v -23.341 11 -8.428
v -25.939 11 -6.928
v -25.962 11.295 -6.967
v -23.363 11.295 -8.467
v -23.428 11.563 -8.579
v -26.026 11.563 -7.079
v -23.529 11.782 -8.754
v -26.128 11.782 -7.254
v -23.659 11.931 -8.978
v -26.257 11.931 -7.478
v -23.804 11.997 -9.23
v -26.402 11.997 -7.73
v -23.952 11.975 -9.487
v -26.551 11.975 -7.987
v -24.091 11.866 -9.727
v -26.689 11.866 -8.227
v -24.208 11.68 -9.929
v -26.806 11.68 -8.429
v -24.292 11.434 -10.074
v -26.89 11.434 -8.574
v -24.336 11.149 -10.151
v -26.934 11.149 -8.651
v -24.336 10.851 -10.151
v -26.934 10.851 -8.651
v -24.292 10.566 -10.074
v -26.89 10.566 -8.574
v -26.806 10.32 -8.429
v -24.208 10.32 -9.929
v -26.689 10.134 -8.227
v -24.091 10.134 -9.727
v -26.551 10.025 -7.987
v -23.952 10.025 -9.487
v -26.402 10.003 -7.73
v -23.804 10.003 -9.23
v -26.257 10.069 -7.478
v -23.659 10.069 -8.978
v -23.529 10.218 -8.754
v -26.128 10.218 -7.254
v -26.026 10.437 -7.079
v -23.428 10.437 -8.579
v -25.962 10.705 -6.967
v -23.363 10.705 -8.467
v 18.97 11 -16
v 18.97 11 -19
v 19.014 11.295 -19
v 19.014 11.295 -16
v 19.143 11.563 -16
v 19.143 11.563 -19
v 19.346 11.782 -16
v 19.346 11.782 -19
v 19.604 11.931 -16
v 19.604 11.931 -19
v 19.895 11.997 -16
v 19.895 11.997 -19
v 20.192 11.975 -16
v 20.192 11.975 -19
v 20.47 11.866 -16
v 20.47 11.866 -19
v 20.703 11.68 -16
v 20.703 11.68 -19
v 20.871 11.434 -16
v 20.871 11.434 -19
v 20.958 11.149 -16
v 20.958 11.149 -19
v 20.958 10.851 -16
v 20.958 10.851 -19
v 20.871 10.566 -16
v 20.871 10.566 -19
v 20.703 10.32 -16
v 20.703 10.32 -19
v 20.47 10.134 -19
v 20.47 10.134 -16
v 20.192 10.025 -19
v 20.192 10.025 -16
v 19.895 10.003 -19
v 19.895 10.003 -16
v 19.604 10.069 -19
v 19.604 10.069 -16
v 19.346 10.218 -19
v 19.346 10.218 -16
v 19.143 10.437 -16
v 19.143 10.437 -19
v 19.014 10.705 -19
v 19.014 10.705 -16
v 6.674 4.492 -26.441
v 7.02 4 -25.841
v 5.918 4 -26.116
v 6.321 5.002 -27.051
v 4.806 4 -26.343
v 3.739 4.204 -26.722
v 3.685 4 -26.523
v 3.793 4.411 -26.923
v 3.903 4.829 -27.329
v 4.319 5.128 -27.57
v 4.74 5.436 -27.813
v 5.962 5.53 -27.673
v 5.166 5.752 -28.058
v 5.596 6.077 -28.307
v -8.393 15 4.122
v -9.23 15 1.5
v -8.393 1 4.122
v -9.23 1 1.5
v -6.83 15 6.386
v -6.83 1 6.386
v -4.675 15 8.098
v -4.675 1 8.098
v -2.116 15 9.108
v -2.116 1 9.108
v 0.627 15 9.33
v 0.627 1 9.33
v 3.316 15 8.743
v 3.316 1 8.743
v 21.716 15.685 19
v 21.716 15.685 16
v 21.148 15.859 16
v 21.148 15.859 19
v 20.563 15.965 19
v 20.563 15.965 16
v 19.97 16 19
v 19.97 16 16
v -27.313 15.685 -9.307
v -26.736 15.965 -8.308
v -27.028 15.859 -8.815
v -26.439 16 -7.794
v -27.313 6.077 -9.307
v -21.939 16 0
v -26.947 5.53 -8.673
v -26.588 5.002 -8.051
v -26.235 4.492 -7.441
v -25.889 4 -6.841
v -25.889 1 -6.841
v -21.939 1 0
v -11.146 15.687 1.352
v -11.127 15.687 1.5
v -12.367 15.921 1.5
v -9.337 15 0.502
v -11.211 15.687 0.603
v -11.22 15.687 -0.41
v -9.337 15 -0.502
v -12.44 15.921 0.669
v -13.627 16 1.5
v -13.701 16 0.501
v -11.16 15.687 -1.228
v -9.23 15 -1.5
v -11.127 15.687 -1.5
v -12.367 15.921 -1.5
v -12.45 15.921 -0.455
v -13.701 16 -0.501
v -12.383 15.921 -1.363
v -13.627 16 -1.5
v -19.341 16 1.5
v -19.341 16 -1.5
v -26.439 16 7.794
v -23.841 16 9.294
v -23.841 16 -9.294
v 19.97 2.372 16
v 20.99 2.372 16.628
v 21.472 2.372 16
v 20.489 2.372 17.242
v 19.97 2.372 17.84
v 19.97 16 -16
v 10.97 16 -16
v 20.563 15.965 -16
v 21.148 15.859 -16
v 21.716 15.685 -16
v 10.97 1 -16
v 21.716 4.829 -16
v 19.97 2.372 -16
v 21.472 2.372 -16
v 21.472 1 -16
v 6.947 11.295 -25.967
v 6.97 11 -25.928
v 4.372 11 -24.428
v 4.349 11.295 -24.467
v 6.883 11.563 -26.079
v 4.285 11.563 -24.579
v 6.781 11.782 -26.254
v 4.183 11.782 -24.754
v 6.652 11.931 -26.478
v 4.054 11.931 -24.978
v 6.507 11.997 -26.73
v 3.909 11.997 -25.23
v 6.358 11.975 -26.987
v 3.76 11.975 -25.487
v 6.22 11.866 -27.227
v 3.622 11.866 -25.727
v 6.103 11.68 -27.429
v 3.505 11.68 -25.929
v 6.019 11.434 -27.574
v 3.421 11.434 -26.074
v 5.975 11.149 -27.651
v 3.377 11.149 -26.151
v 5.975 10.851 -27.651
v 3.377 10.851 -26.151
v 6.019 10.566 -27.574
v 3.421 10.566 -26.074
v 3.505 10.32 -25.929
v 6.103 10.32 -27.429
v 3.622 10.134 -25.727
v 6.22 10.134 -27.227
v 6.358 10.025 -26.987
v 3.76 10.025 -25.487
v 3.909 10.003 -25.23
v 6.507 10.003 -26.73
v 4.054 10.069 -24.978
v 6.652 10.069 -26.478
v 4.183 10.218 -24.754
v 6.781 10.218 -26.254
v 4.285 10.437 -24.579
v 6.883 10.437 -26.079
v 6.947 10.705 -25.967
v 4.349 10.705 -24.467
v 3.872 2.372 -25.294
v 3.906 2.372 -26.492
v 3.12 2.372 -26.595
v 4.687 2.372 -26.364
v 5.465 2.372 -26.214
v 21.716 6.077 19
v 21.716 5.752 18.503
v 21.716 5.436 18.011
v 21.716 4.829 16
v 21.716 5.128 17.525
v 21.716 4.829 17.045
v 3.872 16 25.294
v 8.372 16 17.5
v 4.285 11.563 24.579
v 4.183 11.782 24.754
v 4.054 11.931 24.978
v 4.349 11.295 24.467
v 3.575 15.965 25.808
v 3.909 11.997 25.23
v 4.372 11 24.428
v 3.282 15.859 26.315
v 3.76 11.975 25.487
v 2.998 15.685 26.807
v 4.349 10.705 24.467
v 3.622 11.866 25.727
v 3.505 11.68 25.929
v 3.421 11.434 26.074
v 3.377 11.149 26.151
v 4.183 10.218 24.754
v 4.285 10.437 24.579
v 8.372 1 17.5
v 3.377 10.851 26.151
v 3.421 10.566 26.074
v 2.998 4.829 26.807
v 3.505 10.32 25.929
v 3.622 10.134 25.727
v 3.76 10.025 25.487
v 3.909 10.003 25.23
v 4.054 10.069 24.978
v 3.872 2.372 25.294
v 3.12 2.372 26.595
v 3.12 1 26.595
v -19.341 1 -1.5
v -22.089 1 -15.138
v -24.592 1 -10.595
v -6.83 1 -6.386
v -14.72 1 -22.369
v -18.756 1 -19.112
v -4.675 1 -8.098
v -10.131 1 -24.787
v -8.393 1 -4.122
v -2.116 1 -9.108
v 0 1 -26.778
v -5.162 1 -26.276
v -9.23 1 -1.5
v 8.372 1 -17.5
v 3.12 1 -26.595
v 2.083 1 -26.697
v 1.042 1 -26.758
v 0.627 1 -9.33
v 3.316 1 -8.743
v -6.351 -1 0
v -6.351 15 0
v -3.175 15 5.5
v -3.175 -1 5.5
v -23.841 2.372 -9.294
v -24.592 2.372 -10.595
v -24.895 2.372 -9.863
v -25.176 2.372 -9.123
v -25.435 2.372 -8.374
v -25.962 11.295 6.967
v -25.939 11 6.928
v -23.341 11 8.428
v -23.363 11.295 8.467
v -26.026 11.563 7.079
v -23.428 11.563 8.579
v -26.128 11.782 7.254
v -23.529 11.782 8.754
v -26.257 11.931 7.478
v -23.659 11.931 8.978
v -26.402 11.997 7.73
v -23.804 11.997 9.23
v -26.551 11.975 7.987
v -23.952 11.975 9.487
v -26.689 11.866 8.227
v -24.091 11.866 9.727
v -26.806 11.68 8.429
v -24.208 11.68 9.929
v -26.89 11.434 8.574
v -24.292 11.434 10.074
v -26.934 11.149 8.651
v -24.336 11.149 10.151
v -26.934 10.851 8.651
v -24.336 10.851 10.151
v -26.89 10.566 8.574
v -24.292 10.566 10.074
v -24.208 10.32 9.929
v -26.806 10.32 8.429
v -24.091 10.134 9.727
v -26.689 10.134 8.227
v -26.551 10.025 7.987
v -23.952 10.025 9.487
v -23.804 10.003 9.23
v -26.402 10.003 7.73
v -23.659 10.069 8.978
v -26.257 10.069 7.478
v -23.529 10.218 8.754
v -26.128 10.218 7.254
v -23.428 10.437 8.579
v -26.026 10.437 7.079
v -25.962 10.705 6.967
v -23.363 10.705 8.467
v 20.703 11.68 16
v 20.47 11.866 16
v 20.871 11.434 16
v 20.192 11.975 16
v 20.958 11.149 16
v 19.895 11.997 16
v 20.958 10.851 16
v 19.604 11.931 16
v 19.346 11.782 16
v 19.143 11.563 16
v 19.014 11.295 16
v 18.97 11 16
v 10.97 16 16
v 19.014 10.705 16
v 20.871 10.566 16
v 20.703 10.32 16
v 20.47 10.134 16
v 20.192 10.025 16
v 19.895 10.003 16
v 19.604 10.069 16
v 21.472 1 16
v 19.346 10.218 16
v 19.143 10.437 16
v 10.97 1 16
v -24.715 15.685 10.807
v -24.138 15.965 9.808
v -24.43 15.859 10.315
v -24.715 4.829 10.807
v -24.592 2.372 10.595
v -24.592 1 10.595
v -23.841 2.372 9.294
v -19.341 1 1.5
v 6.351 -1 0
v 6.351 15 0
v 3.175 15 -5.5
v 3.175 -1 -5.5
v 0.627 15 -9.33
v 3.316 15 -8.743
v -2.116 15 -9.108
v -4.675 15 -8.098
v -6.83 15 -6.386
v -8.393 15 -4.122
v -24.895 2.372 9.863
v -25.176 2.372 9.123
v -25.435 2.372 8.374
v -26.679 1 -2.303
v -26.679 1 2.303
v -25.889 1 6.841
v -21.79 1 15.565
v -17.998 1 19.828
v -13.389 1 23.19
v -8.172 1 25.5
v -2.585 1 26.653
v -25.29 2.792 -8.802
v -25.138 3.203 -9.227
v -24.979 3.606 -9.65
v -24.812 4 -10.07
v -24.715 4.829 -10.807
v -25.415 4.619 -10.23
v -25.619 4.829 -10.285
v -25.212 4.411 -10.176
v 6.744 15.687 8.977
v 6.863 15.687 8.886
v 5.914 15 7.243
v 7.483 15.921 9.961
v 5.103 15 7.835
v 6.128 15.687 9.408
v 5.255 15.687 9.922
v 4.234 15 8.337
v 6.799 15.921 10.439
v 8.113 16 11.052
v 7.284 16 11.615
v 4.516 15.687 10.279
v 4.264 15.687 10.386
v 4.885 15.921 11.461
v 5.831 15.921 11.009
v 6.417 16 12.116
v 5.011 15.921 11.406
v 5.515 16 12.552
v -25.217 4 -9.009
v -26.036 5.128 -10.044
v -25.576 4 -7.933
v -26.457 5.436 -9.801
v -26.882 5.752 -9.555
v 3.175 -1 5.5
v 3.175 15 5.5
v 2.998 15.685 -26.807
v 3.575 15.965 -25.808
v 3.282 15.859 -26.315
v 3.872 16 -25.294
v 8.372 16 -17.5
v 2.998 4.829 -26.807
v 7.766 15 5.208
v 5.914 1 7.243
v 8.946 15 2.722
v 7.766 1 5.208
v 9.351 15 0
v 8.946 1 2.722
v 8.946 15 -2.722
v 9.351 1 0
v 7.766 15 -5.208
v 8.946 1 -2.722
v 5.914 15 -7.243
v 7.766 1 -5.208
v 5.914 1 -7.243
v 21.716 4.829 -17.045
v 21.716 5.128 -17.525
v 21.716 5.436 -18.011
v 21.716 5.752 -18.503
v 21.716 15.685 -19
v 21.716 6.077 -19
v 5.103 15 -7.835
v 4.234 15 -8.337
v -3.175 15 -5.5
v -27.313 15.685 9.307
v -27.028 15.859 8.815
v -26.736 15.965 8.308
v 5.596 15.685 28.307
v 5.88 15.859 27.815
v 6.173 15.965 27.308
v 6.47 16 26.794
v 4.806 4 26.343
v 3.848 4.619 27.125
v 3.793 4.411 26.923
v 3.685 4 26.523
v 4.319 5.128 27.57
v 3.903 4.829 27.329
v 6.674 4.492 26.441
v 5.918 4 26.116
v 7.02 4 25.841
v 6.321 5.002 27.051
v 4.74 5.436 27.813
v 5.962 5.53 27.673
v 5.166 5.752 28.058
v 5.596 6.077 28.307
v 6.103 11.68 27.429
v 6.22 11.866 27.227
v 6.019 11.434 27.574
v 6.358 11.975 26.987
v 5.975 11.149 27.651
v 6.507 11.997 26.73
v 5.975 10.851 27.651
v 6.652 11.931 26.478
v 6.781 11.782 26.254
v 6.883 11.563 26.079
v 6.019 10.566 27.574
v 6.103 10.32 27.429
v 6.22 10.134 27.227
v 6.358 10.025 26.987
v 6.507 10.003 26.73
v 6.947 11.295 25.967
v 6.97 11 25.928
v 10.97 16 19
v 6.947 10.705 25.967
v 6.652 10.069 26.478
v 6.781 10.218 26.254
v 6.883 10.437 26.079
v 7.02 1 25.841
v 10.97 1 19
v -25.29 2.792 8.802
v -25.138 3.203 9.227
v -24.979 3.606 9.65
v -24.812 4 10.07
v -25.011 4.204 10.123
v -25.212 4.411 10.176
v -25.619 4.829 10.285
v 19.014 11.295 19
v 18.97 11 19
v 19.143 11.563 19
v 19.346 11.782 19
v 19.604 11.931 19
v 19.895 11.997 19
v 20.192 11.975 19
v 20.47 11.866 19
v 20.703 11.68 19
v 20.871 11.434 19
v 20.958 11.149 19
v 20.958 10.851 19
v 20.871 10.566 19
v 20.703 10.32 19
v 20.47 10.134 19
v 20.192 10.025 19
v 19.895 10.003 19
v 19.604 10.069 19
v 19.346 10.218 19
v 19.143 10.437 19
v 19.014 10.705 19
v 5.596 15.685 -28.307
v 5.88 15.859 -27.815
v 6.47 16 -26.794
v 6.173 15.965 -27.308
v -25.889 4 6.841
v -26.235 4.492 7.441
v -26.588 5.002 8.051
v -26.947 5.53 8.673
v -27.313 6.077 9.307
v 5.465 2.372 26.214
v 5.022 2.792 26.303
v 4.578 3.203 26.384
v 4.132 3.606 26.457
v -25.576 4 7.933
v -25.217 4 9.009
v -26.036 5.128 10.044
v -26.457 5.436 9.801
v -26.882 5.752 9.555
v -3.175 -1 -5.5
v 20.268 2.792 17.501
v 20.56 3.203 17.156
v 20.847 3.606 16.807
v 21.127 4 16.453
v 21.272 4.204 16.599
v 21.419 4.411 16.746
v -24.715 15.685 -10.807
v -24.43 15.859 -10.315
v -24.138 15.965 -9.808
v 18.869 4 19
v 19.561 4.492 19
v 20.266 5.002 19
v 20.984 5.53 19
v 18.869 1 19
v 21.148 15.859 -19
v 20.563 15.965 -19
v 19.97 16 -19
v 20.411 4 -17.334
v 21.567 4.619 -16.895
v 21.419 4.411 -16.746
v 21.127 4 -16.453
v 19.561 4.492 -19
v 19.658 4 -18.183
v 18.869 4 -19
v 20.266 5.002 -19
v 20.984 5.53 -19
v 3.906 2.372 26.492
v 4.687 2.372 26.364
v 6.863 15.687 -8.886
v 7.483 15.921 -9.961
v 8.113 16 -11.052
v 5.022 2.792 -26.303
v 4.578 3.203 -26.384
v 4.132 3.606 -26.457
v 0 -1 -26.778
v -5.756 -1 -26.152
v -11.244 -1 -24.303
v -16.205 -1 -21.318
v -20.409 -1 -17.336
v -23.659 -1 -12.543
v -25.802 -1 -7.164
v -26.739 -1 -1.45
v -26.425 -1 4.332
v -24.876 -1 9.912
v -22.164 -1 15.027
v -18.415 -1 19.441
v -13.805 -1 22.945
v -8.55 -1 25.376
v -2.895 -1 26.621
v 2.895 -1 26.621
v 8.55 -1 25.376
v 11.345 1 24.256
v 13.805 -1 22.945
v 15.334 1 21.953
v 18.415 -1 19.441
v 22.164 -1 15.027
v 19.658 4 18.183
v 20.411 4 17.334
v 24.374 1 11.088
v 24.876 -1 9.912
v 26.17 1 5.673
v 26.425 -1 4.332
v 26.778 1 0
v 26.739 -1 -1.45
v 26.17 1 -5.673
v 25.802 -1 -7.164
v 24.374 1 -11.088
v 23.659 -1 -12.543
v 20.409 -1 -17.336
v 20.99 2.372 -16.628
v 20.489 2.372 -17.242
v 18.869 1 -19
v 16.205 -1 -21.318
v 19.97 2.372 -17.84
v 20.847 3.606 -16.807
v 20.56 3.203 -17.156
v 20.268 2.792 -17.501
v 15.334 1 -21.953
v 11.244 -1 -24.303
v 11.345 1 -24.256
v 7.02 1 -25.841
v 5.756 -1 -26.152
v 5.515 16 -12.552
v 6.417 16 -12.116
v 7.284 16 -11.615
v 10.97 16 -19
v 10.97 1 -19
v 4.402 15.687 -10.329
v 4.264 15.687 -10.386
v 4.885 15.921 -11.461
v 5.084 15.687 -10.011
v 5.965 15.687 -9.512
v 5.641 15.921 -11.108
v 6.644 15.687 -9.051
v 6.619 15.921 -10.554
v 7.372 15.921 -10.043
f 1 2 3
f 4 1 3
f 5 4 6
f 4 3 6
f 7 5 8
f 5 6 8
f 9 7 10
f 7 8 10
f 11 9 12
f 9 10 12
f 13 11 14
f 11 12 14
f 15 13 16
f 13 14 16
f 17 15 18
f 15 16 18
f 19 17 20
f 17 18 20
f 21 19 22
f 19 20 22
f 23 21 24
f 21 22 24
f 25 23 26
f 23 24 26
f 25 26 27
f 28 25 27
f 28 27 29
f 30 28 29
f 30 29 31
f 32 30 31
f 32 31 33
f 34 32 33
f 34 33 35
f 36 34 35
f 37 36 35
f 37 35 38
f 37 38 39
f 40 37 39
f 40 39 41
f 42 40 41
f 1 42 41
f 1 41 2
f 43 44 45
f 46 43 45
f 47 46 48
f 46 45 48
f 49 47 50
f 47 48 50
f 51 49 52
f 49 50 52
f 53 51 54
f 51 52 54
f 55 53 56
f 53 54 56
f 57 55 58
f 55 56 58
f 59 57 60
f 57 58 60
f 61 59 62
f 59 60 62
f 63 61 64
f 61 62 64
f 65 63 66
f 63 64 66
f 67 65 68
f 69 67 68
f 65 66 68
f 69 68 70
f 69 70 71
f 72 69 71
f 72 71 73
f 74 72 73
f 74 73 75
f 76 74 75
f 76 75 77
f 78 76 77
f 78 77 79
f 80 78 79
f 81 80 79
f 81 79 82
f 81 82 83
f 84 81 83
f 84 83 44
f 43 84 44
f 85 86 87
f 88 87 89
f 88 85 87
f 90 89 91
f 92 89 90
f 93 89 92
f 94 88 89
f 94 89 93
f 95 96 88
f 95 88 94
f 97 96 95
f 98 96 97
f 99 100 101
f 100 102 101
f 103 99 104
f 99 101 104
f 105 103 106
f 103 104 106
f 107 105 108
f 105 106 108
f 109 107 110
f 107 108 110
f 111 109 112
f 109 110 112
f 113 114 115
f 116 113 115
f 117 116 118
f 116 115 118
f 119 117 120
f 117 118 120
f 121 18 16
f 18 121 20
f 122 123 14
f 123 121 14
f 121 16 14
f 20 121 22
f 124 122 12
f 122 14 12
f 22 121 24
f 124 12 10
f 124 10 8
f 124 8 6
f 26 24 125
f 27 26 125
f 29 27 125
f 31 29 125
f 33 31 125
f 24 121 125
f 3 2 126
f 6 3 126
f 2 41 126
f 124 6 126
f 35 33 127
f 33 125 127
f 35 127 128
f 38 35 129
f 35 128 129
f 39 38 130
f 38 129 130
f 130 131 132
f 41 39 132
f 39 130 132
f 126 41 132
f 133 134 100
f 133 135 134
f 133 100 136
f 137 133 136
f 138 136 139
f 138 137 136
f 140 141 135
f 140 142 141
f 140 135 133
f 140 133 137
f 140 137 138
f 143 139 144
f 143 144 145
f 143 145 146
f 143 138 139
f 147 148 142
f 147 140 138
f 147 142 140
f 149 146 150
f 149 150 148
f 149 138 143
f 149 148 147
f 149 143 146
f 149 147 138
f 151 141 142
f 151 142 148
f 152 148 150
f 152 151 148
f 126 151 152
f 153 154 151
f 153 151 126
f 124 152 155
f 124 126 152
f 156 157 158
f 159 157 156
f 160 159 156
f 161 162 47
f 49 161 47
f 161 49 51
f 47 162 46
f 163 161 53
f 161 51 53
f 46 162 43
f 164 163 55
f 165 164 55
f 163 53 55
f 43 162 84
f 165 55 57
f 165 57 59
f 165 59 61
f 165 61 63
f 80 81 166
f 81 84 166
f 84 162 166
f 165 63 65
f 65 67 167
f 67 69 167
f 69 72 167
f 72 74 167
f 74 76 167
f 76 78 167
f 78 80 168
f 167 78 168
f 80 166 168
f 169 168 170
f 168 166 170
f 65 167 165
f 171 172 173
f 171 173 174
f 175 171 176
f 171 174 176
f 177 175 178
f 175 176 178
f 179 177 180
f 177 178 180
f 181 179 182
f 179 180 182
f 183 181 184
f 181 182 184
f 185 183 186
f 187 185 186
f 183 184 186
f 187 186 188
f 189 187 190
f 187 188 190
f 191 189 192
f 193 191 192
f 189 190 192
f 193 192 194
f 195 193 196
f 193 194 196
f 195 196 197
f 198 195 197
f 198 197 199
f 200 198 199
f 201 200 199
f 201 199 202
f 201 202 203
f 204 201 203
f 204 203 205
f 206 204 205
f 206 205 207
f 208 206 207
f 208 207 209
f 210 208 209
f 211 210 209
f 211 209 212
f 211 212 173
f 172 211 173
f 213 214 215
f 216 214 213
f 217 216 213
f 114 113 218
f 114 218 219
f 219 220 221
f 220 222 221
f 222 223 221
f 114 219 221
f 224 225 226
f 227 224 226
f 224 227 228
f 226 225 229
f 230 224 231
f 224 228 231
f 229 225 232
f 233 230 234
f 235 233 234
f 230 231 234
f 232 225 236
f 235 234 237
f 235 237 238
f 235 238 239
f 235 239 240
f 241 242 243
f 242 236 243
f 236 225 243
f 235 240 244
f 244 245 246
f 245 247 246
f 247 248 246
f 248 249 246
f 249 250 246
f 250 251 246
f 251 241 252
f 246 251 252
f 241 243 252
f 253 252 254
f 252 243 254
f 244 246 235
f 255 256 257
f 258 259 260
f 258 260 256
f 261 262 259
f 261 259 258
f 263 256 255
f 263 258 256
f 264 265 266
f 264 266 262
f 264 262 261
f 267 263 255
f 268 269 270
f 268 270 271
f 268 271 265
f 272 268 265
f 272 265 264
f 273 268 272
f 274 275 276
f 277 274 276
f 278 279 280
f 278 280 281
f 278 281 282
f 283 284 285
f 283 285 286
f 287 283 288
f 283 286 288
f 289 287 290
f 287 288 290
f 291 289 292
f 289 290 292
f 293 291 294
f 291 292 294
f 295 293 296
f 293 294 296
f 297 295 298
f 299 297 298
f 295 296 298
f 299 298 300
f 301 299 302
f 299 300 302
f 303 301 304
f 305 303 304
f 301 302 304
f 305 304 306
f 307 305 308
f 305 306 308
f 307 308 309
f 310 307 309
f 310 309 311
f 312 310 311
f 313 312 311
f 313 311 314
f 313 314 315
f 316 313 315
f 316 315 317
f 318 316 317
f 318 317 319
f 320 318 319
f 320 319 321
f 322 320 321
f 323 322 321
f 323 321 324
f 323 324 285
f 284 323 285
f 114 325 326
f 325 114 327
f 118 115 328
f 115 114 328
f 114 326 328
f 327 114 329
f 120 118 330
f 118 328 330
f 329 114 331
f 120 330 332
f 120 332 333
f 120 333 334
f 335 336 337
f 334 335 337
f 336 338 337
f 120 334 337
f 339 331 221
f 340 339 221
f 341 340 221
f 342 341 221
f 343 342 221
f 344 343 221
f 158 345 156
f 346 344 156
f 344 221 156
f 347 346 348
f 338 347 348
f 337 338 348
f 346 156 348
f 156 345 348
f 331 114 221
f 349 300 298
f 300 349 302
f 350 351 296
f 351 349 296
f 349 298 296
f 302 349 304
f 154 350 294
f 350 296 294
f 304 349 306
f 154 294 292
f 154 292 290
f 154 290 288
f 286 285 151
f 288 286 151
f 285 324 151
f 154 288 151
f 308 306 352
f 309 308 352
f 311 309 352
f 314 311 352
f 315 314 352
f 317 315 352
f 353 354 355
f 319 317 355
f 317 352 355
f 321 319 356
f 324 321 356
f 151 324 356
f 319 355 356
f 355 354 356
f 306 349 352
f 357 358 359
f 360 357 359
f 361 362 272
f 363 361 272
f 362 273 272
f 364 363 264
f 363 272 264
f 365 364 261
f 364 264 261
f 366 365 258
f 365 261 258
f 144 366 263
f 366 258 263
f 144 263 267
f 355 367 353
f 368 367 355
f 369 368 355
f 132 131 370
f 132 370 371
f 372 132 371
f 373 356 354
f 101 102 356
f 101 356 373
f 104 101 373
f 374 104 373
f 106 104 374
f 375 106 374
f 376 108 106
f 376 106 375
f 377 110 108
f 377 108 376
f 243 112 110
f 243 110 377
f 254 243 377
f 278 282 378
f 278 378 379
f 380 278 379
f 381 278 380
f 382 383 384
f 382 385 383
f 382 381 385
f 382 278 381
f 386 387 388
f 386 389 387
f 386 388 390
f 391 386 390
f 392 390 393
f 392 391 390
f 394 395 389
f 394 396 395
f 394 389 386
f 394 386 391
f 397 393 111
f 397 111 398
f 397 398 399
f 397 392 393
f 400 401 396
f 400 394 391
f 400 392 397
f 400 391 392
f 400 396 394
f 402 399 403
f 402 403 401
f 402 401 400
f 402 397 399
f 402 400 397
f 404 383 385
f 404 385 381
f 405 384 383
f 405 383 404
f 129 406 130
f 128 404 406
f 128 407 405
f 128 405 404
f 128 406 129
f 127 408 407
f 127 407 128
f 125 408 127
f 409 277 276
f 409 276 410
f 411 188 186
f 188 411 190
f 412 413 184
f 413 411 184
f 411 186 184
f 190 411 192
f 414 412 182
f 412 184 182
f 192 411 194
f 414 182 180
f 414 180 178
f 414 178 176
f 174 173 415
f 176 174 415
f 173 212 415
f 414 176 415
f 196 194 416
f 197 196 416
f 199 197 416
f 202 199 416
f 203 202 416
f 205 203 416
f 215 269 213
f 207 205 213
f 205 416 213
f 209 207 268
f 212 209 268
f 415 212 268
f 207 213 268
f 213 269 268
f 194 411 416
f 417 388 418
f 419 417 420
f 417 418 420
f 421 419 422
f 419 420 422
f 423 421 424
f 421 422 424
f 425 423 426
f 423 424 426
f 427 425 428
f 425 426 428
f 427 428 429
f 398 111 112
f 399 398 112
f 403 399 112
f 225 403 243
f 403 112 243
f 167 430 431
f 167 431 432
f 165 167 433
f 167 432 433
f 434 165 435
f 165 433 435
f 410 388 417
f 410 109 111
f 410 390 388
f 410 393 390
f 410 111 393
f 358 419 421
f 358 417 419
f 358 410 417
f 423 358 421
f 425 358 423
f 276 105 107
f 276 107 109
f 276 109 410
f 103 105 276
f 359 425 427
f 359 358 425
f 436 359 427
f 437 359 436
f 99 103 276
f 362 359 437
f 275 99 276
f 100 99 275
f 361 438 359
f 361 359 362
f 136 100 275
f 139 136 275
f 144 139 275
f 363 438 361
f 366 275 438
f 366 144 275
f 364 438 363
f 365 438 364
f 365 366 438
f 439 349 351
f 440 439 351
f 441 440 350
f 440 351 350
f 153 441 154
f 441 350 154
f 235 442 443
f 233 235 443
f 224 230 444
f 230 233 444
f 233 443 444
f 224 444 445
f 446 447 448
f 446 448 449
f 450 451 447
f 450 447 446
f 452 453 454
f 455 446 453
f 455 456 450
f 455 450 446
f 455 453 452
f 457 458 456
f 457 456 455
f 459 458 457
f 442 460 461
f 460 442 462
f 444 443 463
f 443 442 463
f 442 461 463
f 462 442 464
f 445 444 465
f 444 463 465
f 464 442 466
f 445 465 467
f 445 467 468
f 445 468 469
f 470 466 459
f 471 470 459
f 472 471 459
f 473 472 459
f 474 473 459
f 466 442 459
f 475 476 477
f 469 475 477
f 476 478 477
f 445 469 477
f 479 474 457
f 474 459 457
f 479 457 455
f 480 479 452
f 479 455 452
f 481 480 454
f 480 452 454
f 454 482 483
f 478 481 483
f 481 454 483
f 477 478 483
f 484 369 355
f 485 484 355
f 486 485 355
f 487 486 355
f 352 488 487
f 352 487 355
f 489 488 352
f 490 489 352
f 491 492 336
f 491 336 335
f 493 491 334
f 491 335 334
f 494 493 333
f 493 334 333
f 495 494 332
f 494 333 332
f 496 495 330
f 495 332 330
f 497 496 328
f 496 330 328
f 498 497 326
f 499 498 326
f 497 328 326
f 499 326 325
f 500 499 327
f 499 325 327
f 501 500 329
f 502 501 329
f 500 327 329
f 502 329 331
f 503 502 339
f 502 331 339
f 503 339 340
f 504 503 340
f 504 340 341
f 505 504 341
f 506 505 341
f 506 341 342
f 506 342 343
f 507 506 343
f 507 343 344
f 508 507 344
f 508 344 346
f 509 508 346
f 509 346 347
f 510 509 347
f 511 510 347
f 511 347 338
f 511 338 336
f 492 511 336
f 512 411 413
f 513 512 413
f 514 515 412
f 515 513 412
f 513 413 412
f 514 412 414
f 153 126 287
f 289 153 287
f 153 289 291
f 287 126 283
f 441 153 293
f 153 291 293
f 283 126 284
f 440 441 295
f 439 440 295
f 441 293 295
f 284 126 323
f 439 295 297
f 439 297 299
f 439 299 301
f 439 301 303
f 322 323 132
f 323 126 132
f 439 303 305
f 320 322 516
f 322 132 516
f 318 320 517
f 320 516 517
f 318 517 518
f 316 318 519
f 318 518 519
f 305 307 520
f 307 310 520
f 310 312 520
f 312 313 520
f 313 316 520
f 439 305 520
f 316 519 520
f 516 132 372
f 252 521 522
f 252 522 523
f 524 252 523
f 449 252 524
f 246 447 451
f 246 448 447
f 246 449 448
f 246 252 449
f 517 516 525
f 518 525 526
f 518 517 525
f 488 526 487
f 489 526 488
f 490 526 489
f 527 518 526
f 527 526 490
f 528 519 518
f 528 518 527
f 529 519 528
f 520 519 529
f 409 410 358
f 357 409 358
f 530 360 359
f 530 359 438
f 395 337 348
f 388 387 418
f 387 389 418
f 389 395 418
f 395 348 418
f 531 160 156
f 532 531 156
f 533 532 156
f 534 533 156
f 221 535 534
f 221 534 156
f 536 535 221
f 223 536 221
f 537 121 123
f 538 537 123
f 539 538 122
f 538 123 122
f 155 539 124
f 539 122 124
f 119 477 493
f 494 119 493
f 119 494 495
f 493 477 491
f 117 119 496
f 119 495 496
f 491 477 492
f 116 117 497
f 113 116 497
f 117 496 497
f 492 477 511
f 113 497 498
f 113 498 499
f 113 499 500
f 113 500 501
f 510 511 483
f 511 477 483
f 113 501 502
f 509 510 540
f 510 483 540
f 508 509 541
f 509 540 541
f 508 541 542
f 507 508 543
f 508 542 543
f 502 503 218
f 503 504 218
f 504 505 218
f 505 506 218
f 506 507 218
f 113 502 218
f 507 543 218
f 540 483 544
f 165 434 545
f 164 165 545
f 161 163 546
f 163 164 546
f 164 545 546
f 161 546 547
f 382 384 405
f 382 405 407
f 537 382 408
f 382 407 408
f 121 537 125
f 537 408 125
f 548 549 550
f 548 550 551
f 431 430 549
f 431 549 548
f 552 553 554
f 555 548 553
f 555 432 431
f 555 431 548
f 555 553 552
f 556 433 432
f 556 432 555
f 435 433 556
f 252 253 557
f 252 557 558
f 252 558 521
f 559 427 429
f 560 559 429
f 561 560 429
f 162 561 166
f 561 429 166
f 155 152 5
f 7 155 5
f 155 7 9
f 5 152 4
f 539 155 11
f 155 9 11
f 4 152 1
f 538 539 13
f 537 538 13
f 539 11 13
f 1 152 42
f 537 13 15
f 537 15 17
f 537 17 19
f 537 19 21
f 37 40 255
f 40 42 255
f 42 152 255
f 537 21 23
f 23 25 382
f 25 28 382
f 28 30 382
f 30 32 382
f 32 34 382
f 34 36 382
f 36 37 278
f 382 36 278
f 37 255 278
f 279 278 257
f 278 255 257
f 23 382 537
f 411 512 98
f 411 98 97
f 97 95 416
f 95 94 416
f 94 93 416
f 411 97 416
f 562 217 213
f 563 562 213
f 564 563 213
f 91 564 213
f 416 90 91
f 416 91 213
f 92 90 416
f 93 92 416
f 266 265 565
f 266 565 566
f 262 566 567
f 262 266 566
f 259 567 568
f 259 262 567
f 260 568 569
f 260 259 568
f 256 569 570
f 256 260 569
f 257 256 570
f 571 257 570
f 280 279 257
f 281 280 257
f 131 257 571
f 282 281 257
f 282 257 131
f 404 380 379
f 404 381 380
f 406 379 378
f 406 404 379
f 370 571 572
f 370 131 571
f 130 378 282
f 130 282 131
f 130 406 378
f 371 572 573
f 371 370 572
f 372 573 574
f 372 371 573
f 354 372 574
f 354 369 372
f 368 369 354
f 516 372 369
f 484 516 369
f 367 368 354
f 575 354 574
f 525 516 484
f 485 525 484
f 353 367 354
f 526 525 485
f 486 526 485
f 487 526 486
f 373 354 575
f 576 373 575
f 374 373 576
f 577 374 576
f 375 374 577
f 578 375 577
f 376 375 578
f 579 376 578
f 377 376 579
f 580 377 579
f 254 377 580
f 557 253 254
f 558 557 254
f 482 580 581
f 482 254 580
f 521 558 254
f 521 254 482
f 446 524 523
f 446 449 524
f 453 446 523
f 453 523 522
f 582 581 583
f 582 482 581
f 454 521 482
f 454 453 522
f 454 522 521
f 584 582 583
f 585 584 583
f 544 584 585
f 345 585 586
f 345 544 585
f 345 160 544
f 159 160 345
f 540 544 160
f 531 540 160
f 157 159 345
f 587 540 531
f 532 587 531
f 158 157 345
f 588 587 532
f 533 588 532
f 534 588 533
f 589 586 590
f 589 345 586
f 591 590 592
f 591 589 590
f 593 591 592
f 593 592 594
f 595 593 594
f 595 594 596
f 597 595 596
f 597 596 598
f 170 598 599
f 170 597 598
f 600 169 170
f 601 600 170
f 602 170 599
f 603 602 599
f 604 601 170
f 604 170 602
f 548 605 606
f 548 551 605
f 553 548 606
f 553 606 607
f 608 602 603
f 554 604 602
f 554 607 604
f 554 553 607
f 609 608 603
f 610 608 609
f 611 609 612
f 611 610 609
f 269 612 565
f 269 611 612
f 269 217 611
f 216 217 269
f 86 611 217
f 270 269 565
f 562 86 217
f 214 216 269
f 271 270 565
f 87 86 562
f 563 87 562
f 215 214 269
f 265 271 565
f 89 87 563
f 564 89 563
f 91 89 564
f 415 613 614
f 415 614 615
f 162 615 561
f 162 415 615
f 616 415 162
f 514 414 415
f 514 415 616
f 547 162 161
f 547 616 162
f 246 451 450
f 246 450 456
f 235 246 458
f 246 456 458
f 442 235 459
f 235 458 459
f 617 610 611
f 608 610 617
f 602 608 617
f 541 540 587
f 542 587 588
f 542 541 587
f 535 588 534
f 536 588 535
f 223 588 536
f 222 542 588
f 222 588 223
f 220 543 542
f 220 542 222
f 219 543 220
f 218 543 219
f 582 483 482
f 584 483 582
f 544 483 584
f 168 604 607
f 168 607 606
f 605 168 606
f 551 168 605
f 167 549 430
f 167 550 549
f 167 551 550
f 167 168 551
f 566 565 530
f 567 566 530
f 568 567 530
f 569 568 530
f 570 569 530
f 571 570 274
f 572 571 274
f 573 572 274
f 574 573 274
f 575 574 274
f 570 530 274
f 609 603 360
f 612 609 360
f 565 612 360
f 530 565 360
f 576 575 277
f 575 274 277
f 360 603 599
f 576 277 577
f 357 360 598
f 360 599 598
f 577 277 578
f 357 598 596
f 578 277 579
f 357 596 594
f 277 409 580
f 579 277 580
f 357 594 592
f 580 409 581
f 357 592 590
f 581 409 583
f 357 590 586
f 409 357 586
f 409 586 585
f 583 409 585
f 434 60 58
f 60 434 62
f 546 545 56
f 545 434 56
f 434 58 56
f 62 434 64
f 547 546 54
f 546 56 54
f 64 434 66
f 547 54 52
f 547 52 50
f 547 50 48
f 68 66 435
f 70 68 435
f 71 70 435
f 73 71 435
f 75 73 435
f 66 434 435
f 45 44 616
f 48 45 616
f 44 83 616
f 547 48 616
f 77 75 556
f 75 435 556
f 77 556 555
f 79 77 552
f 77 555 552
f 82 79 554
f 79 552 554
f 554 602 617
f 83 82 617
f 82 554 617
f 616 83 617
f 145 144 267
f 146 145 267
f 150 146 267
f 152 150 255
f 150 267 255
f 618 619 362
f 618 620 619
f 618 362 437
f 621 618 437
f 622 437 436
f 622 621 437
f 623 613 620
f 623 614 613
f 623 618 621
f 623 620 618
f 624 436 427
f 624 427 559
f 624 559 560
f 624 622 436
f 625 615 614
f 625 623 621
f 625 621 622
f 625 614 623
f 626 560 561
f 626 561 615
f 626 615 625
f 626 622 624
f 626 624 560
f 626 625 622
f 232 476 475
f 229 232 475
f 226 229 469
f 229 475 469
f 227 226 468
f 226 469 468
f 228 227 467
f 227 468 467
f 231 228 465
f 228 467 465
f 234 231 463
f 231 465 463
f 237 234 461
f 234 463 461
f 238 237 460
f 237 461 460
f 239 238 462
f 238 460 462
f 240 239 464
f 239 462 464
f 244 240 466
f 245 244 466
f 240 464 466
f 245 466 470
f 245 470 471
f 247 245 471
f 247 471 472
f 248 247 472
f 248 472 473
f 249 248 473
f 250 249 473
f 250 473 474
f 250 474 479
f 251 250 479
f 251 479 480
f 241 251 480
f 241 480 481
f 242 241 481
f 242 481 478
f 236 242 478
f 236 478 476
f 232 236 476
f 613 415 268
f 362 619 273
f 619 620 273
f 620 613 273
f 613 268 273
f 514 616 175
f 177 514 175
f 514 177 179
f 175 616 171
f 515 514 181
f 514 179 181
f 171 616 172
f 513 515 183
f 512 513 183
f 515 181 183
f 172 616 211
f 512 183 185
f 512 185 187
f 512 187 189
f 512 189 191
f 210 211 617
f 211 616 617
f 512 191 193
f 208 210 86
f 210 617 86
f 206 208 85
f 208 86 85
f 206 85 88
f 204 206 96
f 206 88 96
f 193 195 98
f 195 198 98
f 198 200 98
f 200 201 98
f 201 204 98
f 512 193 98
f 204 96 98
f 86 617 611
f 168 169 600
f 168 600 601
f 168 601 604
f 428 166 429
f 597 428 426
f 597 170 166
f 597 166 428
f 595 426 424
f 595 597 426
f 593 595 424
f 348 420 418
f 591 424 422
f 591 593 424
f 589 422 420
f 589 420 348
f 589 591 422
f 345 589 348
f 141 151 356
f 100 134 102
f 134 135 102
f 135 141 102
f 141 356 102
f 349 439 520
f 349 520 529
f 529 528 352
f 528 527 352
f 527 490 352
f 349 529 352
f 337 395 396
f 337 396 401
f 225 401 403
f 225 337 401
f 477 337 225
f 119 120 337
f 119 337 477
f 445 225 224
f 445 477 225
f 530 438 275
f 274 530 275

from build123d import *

# Parameters (mm, degrees)
BOSS_EXTRUDE1_DEPTH      = 1
BOSS_EXTRUDE1_DEPTH_BACK = 1
SKETCH2_R                = 30
SKETCH1_R                = 9.350852961
BOSS_EXTRUDE2_DEPTH      = 14
BOSS_EXTRUDE3_DEPTH      = 15
CIRPATTERN1_COUNT        = 3
CUT_EXTRUDE2_DEPTH       = 64.041803276
SKETCH4_R                = 1
CUT_EXTRUDE3_DEPTH       = 43
CIRPATTERN2_COUNT        = 3
CUT_EXTRUDE4_DEPTH       = 43
FILLET1_R                = 10


with BuildPart() as part:
    # Sketch2 → Boss-Extrude1 (new, two sides: drawn at the far end of the back side and taken through both)
    with BuildSketch(Plane(origin=(0, 0, 0), x_dir=(1, 0, 0), z_dir=(0, 1, 0)).offset(-BOSS_EXTRUDE1_DEPTH_BACK)):
        with Locations(Location((0, 0, 0), (0, 0, 270))):
            Circle(SKETCH2_R)
    extrude(amount=BOSS_EXTRUDE1_DEPTH + BOSS_EXTRUDE1_DEPTH_BACK)

    # Sketch1 → Boss-Extrude2 (add)
    with BuildSketch(Plane(origin=(0, 1, 0), x_dir=(1, 0, 0), z_dir=(0, 1, 0))):
        with Locations(Location((0, 0, 0), (0, 0, 90))):
            Circle(SKETCH1_R)
        Polygon((3.175426481, -5.5), (6.350852961, 0), (3.175426481, 5.5), (-3.175426481, 5.5), (-6.350852961, 0), (-3.175426481, -5.5), align=None, mode=Mode.SUBTRACT)
    extrude(amount=BOSS_EXTRUDE2_DEPTH)

    # Sketch1<3> → Boss-Extrude3 (add)
    with BuildSketch(Plane(origin=(0, 1, 0), x_dir=(1, 0, 0), z_dir=(0, 1, 0))):
        with BuildLine():
            Line((2.998219694, 26.806931157), (8.371578903, 17.5))
            Line((8.371578903, 17.5), (3.315841392, 8.74320576))
            ThreePointArc((3.315841392, 8.74320576), (4.675426481, 8.098076211), (5.913917603, 7.24320576))
            Line((5.913917603, 7.24320576), (10.969655115, 16))
            Line((10.969655115, 16), (21.716373532, 16))
            Line((21.716373532, 16), (21.716373532, 19))
            Line((21.716373532, 19), (10.969655115, 19))
            Line((10.969655115, 19), (5.596295906, 28.306931157))
            Line((5.596295906, 28.306931157), (2.998219694, 26.806931157))
        make_face()
    boss_extrude3 = extrude(amount=BOSS_EXTRUDE3_DEPTH)

    # CirPattern1: Boss-Extrude3 ×3 about axis
    cirpattern1_axis = Axis((0, 0, 0), (0, 1, 0))
    for i in range(1, CIRPATTERN1_COUNT):
        add(boss_extrude3.rotate(cirpattern1_axis, i * 360 / CIRPATTERN1_COUNT))

    # Sketch3 → Cut-Extrude2 (cut, symmetric)
    with BuildSketch(Plane(origin=(-16.454482672, 0, 9.5), x_dir=(0.5000000000000041, 0, 0.8660254037844364), z_dir=(-0.8660254037844363, 0, 0.500000000000004))):
        Polygon((-19.969655115, 2.372421116), (-21.716373532, 4.828660441), (-21.716373532, 2.372421116), align=None)
        with BuildLine():
            Line((-21.716373532, 16), (-21.716373532, 15.684973294))
            ThreePointArc((-21.716373532, 15.684973294), (-20.857104699, 15.920613096), (-19.969655115, 16))
            Line((-19.969655115, 16), (-21.716373532, 16))
        make_face()
    cut_extrude2 = extrude(amount=CUT_EXTRUDE2_DEPTH, both=True, mode=Mode.SUBTRACT)

    # Sketch4 → Cut-Extrude3 (cut)
    with BuildSketch(Plane(origin=(-16.454482672, 0, 9.5), x_dir=(0.500000000000004, 0, 0.8660254037844364), z_dir=(-0.8660254037844365, 0, 0.500000000000004))):
        with Locations((-19.969655115, 11)):
            Circle(SKETCH4_R)
    cut_extrude3 = extrude(amount=-CUT_EXTRUDE3_DEPTH, mode=Mode.SUBTRACT)

    # CirPattern2: Cut-Extrude2, Cut-Extrude3 ×3 about axis
    cirpattern2_axis = Axis((0, 1, 0), (0, 1, 0))
    add([cut_extrude2.rotate(cirpattern2_axis, i * 360 / CIRPATTERN2_COUNT) for i in range(1, CIRPATTERN2_COUNT)], mode=Mode.SUBTRACT)
    add([cut_extrude3.rotate(cirpattern2_axis, i * 360 / CIRPATTERN2_COUNT) for i in range(1, CIRPATTERN2_COUNT)], mode=Mode.SUBTRACT)

    # Sketch5 → Cut-Revolve2 (revolve, cut)
    with BuildSketch(Plane(origin=(0, 0, 0), x_dir=(0, 0, -1), z_dir=(1, 0, 0)), mode=Mode.PRIVATE) as cut_revolve2_sk:
        Polygon((-26.777856991, 4), (-31.777856991, 9), (-31.777856991, -1), (-26.777856991, -1), align=None)
    revolve(cut_revolve2_sk.sketch.rotate(Axis((0, -1000, 0), (0, 1, 0)), 180), axis=Axis((0, -1000, 0), (0, 1, 0)), mode=Mode.SUBTRACT)

    # Sketch1<4> → Cut-Extrude4 (cut)
    with BuildSketch(Plane(origin=(0, 1, 0), x_dir=(1, 0, 0), z_dir=(0, 1, 0))):
        Polygon((-3.175426481, -5.5), (3.175426481, -5.5), (6.350852961, 0), (3.175426481, 5.5), (-3.175426481, 5.5), (-6.350852961, 0), align=None)
    extrude(amount=-CUT_EXTRUDE4_DEPTH, mode=Mode.SUBTRACT)

    # Fillet1
    # the kernel refuses this fillet: 10 mm, written as the material it takes off along each edge
    with BuildSketch(Plane(origin=(0, 16, 0), x_dir=(0.9612469799967569, 0, -0.27568867123462737), z_dir=(-0.27568867123462737, 0, -0.9612469799967569))) as fillet1_piece_1:
        with BuildLine():
            CenterArc((13.709751905, 10), FILLET1_R, 244.158067237, 25.841932763)
            Line((9.350852961, 1), (9.263674982, 0.82))
            ThreePointArc((9.263674982, 0.82), (9.150852961, 0.5), (9.150852961, 0))
            Line((9.150852961, 0), (9.350852961, -0.2))
            Line((9.350852961, -0.2), (13.709751905, -0.2))
            Line((13.709751905, -0.2), (13.709751905, 0))
        make_face()
    revolve(axis=Axis((0, 16, 0), (0, -1, 0)), revolution_arc=152.006117334, mode=Mode.SUBTRACT)
    with BuildSketch(Plane(origin=(0, 16, 0), x_dir=(-0.24187009717361344, 0, 0.9703086396055776), z_dir=(0.9703086396055776, 0, 0.24187009717361344))) as fillet1_piece_2:
        with BuildLine():
            CenterArc((13.709751905, 10), FILLET1_R, 244.158067237, 25.841932763)
            Line((9.350852961, 1), (9.263674982, 0.82))
            ThreePointArc((9.263674982, 0.82), (9.150852961, 0.5), (9.150852961, 0))
            Line((9.150852961, 0), (9.350852961, -0.2))
            Line((9.350852961, -0.2), (13.709751905, -0.2))
            Line((13.709751905, -0.2), (13.709751905, 0))
        make_face()
    revolve(axis=Axis((0, 16, 0), (0, -1, 0)), revolution_arc=152.006117334, mode=Mode.SUBTRACT)
    with BuildSketch(Plane(origin=(0, 16, 0), x_dir=(-0.7193768828231427, 0, -0.6946199683709492), z_dir=(-0.6946199683709492, 0, 0.7193768828231427))) as fillet1_piece_3:
        with BuildLine():
            CenterArc((13.709751905, 10), FILLET1_R, 244.158067237, 25.841932763)
            Line((13.709751905, 0), (13.709751905, -0.2))
            Line((13.709751905, -0.2), (9.350852961, -0.2))
            Line((9.350852961, -0.2), (9.150852961, 0))
            ThreePointArc((9.150852961, 0), (9.150852961, 0.5), (9.263674982, 0.82))
            Line((9.263674982, 0.82), (9.350852961, 1))
        make_face()
    revolve(axis=Axis((0, 16, 0), (0, -1, 0)), revolution_arc=152.006117334, mode=Mode.SUBTRACT)


solid = part.part
